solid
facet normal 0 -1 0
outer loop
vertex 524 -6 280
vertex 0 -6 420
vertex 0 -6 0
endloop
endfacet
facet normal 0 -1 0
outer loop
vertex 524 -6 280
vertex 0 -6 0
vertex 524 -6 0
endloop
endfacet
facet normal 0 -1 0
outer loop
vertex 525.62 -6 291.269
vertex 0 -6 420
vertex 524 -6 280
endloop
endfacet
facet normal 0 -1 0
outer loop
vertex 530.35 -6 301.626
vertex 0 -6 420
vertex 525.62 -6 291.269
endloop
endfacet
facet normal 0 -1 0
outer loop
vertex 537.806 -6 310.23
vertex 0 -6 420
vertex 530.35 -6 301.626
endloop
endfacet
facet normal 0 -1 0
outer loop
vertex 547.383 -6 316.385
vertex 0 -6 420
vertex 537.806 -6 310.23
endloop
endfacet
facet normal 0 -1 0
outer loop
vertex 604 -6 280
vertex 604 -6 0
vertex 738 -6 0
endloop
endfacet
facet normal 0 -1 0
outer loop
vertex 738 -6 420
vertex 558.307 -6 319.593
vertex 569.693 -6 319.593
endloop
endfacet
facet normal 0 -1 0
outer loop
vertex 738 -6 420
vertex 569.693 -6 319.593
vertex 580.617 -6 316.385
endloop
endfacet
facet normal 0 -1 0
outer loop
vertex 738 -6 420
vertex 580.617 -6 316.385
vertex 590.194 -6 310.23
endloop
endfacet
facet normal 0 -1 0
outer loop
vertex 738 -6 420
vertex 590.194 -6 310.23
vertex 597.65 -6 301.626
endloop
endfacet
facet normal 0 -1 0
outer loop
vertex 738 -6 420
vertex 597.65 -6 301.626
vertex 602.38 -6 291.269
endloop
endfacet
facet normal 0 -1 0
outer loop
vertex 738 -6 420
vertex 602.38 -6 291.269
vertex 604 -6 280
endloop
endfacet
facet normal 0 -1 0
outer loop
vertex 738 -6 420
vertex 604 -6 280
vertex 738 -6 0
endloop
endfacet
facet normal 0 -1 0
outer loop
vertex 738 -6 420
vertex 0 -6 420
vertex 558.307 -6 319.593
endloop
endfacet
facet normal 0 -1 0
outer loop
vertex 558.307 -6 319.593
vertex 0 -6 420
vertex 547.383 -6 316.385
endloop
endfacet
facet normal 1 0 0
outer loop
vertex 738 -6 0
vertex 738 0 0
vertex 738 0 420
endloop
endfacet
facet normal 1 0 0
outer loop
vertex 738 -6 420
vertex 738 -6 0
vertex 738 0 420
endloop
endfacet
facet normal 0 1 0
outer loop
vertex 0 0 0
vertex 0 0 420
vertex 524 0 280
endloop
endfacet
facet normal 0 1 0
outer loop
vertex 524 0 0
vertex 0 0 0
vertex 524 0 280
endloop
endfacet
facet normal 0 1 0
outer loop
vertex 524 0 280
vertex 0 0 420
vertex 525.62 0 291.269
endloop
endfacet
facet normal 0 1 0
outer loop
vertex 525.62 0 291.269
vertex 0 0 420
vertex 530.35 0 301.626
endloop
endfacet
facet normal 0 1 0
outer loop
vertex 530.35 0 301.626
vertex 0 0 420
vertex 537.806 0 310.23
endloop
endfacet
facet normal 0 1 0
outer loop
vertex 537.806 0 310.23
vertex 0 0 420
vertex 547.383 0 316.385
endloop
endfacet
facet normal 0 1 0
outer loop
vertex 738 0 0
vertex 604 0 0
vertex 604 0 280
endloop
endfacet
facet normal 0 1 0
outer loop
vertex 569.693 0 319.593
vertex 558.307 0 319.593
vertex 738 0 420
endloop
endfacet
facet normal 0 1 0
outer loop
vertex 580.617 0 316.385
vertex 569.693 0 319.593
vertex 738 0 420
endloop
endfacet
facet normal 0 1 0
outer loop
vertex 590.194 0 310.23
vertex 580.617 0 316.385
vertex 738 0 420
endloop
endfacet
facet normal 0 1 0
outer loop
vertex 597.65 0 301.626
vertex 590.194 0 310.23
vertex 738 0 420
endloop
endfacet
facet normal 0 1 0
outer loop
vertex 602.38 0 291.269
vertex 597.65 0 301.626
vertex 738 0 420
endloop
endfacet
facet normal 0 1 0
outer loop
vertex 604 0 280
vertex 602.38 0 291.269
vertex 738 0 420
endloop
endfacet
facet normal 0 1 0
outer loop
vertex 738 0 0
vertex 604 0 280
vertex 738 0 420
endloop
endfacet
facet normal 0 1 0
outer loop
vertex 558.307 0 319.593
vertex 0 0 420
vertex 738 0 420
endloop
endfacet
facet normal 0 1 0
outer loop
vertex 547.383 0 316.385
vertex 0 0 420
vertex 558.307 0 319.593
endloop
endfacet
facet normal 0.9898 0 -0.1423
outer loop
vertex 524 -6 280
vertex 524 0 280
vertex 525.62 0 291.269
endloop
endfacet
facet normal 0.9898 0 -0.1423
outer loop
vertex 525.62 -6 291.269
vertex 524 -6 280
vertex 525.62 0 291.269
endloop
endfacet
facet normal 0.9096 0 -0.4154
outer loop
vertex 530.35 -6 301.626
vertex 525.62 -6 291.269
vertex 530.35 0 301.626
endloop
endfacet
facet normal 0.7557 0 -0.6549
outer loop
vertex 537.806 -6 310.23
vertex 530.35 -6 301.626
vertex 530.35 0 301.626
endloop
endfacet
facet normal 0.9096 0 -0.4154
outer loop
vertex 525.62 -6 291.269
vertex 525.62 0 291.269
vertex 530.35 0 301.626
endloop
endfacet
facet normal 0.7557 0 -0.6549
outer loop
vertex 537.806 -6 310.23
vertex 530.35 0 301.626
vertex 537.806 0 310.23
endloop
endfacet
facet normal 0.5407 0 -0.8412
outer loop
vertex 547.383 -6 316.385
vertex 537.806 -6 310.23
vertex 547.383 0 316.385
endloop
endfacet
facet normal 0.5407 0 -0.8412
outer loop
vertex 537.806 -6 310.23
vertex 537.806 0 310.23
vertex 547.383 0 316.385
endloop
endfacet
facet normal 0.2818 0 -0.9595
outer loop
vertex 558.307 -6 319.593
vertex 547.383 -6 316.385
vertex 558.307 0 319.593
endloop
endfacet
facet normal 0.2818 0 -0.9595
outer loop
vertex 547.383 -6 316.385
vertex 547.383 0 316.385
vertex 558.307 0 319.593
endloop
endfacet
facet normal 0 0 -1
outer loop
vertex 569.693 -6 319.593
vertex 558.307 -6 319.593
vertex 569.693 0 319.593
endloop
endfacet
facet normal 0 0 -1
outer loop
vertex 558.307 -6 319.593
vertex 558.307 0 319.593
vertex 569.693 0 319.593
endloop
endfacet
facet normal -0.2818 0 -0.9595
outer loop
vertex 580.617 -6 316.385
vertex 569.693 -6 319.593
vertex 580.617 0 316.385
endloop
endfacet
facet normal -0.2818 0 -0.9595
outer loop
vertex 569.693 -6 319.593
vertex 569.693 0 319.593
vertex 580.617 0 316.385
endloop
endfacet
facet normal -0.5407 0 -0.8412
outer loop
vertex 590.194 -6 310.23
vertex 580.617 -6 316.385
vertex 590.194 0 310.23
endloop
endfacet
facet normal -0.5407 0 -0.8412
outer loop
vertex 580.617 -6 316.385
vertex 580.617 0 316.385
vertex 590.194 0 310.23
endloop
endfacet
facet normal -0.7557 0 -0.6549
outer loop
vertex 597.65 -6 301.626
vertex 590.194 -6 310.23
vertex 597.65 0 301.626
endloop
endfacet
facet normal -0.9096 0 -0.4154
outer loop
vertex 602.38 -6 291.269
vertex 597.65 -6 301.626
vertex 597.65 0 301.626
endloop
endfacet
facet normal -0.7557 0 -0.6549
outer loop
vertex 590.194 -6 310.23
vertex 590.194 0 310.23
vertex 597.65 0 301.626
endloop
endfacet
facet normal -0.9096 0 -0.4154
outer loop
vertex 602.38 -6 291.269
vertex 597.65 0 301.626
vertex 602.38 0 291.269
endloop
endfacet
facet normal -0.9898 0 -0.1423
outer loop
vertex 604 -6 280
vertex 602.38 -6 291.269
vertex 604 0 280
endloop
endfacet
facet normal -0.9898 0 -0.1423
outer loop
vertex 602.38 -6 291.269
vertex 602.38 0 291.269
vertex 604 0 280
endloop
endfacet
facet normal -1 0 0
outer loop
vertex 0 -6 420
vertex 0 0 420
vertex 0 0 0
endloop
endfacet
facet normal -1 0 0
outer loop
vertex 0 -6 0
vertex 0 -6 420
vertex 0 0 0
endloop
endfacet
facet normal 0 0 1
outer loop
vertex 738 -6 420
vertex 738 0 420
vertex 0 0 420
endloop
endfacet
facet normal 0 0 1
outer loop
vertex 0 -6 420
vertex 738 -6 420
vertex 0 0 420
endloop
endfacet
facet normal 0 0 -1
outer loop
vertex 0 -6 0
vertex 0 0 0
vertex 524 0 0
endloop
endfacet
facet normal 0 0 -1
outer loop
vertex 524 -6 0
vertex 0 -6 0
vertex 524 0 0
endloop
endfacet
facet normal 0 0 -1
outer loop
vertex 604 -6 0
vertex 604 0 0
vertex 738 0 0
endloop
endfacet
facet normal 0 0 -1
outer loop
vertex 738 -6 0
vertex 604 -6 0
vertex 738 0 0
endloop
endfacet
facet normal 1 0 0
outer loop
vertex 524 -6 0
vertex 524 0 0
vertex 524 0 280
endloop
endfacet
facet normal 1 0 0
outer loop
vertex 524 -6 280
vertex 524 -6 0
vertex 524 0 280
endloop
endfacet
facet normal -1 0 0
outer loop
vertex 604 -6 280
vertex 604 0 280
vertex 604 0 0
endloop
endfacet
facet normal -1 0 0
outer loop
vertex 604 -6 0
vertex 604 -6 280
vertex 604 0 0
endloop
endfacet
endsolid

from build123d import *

# Parameters (mm, degrees)
F1_DEPTH = 6


with BuildPart() as f1:
    # F0 (on Front) → F1 (new body)
    with BuildSketch(Plane.XZ):
        with BuildLine():
            Line((0, 420), (0, 0))
            Line((0, 0), (524, 0))
            Line((524, 0), (524, 280))
            ThreePointArc((524, 280), (564, 320), (604, 280))
            Line((604, 280), (604, 0))
            Line((604, 0), (738, 0))
            Line((738, 0), (738, 420))
            Line((738, 420), (0, 420))
        make_face()
    extrude(amount=F1_DEPTH)


solid = f1.part
